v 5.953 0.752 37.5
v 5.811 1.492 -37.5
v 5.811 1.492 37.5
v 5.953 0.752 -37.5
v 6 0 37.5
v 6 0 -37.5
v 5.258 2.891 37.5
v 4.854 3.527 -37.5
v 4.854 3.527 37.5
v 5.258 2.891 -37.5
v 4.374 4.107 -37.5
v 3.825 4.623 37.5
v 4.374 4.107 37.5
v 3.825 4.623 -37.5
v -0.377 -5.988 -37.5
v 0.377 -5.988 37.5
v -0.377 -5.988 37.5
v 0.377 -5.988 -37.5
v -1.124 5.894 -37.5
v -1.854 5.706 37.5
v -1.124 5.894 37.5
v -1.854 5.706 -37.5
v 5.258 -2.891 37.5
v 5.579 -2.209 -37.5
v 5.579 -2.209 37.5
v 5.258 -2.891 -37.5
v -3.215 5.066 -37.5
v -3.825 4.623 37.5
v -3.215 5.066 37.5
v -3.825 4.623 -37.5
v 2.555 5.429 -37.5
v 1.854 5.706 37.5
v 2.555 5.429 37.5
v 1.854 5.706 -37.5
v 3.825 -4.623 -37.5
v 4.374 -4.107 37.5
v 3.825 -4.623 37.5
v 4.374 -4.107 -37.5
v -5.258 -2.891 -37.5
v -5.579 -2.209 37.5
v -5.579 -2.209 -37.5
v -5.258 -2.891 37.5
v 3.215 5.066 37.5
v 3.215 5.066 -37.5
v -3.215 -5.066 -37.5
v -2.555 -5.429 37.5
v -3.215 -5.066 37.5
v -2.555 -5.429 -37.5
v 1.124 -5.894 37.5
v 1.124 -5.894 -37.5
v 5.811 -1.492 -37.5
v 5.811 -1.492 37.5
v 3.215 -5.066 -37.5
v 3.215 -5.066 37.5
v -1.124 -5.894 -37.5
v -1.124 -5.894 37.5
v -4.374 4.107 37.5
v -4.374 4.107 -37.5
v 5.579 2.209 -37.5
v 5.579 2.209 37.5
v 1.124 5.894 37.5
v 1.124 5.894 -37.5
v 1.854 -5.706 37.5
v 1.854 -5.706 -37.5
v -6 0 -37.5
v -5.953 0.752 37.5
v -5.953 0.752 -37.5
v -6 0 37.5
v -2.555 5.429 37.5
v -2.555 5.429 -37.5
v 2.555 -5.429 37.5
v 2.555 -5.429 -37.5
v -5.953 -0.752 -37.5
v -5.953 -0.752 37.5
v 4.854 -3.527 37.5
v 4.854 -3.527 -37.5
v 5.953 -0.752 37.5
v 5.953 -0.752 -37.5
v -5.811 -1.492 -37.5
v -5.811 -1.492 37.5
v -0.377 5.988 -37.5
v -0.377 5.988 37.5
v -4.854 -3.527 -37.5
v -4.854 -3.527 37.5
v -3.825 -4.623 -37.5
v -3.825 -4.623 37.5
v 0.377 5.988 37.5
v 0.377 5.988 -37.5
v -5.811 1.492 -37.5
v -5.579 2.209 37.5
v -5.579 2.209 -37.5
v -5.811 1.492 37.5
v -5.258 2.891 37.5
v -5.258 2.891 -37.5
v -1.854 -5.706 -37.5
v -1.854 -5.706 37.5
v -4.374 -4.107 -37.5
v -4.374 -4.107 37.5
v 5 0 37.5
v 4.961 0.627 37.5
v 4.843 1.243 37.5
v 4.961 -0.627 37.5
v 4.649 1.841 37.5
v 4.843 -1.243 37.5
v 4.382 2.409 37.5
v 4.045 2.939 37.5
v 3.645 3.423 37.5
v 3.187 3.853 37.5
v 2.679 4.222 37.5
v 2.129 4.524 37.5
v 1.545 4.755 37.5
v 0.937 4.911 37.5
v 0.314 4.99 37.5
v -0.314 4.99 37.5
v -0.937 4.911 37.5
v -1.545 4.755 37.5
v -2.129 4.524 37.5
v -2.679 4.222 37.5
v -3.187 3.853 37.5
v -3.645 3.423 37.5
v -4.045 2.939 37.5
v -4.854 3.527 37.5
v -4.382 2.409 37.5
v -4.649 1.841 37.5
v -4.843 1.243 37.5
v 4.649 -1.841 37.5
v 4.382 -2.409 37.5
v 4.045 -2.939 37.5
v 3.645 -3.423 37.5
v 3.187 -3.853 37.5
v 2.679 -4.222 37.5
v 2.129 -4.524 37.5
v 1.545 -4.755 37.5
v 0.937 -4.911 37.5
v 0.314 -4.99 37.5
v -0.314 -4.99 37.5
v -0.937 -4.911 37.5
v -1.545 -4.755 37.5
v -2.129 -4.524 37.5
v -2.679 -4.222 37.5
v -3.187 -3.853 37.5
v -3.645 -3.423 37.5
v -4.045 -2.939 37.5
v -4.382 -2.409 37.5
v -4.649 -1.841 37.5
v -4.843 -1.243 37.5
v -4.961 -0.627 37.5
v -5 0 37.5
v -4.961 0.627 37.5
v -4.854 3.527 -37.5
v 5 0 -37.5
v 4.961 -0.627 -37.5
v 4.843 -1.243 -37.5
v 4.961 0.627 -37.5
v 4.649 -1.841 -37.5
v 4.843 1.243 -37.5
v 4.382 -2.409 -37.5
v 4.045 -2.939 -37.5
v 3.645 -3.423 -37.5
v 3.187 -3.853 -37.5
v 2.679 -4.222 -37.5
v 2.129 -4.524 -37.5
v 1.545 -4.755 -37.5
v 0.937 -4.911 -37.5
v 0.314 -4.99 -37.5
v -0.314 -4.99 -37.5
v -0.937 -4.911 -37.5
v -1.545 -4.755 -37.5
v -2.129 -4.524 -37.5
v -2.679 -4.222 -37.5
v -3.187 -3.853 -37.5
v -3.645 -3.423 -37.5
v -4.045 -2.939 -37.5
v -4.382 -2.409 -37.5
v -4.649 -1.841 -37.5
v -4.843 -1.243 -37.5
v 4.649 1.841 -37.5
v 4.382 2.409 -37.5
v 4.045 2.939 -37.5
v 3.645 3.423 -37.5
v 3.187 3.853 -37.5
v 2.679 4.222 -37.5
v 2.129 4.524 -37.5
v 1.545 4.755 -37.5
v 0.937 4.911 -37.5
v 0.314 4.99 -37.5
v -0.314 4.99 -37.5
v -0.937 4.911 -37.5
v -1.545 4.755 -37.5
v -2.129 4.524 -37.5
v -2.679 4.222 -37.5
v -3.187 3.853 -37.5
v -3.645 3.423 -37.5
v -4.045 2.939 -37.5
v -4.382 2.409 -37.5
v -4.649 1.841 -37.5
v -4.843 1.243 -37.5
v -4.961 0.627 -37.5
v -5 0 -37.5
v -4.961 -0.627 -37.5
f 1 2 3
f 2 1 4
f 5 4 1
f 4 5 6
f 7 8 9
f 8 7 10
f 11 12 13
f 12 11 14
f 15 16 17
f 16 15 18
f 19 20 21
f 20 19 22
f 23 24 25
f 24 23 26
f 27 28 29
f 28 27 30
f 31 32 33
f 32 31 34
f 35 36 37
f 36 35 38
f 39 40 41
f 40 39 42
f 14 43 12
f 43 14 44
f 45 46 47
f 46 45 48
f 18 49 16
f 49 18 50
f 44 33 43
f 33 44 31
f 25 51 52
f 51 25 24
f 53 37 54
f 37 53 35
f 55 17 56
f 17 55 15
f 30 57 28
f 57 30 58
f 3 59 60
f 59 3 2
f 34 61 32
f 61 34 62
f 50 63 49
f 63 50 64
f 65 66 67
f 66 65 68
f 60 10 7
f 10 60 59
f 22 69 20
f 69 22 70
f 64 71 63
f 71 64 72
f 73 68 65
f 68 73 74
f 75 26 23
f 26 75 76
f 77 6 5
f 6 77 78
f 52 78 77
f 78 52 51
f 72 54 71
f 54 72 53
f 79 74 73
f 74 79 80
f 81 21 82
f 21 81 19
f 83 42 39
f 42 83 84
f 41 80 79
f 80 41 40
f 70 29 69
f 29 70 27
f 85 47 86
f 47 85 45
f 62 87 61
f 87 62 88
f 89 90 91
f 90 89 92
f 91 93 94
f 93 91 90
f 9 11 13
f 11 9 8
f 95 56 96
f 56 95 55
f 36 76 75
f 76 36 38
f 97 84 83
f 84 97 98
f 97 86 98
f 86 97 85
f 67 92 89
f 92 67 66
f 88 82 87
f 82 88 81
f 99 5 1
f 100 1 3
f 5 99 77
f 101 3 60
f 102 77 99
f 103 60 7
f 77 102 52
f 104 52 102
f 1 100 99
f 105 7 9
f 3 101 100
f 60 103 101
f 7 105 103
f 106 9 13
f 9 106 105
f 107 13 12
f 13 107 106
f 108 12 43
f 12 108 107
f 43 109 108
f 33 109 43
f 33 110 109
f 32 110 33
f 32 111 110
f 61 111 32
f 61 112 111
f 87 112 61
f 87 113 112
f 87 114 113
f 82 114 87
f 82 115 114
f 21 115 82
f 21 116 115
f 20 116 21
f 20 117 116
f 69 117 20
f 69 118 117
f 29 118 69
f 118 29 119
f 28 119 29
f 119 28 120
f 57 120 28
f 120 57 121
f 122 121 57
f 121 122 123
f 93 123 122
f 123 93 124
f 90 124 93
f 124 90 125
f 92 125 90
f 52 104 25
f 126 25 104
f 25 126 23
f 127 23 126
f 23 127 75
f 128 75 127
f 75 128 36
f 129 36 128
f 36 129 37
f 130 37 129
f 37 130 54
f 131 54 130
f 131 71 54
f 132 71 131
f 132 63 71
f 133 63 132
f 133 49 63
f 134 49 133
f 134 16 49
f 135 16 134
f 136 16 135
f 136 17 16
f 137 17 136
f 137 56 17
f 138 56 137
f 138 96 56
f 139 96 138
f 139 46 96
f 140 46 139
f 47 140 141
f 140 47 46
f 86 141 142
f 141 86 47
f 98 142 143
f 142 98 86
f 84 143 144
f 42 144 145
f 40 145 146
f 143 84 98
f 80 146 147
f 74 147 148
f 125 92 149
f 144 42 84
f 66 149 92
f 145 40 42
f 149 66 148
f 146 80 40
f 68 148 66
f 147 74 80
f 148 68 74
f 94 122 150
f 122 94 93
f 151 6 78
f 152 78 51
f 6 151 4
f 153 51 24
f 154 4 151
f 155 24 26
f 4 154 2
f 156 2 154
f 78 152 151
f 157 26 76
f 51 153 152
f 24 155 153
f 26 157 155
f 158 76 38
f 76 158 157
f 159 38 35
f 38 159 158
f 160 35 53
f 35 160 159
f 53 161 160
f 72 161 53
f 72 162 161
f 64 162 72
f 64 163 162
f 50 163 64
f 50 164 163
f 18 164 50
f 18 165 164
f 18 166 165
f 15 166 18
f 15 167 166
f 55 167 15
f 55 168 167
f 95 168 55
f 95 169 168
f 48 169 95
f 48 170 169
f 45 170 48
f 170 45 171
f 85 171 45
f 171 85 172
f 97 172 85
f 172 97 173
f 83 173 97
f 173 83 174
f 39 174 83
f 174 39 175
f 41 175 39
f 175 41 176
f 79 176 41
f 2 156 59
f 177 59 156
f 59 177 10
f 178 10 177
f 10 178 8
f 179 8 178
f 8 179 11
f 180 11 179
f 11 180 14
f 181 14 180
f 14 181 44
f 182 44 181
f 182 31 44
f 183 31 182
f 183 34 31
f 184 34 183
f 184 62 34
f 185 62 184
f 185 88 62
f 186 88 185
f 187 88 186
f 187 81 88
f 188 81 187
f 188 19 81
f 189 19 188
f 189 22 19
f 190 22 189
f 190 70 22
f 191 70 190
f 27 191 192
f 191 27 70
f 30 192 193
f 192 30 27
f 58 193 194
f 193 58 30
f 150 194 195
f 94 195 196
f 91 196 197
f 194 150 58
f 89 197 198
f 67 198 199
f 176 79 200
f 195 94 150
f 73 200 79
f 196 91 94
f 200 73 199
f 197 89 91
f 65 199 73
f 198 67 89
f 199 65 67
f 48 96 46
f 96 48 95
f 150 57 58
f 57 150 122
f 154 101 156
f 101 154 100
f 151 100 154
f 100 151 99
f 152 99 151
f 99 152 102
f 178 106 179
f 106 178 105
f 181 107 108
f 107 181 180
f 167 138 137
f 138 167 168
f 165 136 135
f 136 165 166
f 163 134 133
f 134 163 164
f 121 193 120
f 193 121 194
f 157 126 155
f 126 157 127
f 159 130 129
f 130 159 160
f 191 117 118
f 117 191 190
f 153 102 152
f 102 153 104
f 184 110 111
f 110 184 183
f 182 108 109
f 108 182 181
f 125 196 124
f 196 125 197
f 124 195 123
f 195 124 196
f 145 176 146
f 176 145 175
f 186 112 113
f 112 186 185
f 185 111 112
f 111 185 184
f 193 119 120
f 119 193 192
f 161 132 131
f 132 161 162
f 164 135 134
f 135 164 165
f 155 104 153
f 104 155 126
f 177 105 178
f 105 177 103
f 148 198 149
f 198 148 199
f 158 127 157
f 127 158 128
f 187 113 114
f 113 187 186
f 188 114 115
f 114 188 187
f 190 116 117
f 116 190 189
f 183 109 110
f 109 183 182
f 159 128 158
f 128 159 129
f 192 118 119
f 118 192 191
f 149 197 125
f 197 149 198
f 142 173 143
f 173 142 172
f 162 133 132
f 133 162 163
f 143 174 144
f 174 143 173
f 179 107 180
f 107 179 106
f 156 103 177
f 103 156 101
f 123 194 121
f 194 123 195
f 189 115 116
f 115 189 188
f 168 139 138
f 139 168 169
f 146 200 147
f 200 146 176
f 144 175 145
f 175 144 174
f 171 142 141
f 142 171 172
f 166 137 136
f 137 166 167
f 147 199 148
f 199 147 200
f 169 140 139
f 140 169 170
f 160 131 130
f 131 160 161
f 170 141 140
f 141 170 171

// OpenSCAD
$fn = 50;


difference() {
	union() {
		translate(v = [0, 0, -37.5000000000]) {
			cylinder(h = 75, r = 6.0000000000);
		}
	}
	union() {
		translate(v = [0, 0, -100.0000000000]) {
			cylinder(h = 200, r = 5.0000000000);
		}
	}
}
